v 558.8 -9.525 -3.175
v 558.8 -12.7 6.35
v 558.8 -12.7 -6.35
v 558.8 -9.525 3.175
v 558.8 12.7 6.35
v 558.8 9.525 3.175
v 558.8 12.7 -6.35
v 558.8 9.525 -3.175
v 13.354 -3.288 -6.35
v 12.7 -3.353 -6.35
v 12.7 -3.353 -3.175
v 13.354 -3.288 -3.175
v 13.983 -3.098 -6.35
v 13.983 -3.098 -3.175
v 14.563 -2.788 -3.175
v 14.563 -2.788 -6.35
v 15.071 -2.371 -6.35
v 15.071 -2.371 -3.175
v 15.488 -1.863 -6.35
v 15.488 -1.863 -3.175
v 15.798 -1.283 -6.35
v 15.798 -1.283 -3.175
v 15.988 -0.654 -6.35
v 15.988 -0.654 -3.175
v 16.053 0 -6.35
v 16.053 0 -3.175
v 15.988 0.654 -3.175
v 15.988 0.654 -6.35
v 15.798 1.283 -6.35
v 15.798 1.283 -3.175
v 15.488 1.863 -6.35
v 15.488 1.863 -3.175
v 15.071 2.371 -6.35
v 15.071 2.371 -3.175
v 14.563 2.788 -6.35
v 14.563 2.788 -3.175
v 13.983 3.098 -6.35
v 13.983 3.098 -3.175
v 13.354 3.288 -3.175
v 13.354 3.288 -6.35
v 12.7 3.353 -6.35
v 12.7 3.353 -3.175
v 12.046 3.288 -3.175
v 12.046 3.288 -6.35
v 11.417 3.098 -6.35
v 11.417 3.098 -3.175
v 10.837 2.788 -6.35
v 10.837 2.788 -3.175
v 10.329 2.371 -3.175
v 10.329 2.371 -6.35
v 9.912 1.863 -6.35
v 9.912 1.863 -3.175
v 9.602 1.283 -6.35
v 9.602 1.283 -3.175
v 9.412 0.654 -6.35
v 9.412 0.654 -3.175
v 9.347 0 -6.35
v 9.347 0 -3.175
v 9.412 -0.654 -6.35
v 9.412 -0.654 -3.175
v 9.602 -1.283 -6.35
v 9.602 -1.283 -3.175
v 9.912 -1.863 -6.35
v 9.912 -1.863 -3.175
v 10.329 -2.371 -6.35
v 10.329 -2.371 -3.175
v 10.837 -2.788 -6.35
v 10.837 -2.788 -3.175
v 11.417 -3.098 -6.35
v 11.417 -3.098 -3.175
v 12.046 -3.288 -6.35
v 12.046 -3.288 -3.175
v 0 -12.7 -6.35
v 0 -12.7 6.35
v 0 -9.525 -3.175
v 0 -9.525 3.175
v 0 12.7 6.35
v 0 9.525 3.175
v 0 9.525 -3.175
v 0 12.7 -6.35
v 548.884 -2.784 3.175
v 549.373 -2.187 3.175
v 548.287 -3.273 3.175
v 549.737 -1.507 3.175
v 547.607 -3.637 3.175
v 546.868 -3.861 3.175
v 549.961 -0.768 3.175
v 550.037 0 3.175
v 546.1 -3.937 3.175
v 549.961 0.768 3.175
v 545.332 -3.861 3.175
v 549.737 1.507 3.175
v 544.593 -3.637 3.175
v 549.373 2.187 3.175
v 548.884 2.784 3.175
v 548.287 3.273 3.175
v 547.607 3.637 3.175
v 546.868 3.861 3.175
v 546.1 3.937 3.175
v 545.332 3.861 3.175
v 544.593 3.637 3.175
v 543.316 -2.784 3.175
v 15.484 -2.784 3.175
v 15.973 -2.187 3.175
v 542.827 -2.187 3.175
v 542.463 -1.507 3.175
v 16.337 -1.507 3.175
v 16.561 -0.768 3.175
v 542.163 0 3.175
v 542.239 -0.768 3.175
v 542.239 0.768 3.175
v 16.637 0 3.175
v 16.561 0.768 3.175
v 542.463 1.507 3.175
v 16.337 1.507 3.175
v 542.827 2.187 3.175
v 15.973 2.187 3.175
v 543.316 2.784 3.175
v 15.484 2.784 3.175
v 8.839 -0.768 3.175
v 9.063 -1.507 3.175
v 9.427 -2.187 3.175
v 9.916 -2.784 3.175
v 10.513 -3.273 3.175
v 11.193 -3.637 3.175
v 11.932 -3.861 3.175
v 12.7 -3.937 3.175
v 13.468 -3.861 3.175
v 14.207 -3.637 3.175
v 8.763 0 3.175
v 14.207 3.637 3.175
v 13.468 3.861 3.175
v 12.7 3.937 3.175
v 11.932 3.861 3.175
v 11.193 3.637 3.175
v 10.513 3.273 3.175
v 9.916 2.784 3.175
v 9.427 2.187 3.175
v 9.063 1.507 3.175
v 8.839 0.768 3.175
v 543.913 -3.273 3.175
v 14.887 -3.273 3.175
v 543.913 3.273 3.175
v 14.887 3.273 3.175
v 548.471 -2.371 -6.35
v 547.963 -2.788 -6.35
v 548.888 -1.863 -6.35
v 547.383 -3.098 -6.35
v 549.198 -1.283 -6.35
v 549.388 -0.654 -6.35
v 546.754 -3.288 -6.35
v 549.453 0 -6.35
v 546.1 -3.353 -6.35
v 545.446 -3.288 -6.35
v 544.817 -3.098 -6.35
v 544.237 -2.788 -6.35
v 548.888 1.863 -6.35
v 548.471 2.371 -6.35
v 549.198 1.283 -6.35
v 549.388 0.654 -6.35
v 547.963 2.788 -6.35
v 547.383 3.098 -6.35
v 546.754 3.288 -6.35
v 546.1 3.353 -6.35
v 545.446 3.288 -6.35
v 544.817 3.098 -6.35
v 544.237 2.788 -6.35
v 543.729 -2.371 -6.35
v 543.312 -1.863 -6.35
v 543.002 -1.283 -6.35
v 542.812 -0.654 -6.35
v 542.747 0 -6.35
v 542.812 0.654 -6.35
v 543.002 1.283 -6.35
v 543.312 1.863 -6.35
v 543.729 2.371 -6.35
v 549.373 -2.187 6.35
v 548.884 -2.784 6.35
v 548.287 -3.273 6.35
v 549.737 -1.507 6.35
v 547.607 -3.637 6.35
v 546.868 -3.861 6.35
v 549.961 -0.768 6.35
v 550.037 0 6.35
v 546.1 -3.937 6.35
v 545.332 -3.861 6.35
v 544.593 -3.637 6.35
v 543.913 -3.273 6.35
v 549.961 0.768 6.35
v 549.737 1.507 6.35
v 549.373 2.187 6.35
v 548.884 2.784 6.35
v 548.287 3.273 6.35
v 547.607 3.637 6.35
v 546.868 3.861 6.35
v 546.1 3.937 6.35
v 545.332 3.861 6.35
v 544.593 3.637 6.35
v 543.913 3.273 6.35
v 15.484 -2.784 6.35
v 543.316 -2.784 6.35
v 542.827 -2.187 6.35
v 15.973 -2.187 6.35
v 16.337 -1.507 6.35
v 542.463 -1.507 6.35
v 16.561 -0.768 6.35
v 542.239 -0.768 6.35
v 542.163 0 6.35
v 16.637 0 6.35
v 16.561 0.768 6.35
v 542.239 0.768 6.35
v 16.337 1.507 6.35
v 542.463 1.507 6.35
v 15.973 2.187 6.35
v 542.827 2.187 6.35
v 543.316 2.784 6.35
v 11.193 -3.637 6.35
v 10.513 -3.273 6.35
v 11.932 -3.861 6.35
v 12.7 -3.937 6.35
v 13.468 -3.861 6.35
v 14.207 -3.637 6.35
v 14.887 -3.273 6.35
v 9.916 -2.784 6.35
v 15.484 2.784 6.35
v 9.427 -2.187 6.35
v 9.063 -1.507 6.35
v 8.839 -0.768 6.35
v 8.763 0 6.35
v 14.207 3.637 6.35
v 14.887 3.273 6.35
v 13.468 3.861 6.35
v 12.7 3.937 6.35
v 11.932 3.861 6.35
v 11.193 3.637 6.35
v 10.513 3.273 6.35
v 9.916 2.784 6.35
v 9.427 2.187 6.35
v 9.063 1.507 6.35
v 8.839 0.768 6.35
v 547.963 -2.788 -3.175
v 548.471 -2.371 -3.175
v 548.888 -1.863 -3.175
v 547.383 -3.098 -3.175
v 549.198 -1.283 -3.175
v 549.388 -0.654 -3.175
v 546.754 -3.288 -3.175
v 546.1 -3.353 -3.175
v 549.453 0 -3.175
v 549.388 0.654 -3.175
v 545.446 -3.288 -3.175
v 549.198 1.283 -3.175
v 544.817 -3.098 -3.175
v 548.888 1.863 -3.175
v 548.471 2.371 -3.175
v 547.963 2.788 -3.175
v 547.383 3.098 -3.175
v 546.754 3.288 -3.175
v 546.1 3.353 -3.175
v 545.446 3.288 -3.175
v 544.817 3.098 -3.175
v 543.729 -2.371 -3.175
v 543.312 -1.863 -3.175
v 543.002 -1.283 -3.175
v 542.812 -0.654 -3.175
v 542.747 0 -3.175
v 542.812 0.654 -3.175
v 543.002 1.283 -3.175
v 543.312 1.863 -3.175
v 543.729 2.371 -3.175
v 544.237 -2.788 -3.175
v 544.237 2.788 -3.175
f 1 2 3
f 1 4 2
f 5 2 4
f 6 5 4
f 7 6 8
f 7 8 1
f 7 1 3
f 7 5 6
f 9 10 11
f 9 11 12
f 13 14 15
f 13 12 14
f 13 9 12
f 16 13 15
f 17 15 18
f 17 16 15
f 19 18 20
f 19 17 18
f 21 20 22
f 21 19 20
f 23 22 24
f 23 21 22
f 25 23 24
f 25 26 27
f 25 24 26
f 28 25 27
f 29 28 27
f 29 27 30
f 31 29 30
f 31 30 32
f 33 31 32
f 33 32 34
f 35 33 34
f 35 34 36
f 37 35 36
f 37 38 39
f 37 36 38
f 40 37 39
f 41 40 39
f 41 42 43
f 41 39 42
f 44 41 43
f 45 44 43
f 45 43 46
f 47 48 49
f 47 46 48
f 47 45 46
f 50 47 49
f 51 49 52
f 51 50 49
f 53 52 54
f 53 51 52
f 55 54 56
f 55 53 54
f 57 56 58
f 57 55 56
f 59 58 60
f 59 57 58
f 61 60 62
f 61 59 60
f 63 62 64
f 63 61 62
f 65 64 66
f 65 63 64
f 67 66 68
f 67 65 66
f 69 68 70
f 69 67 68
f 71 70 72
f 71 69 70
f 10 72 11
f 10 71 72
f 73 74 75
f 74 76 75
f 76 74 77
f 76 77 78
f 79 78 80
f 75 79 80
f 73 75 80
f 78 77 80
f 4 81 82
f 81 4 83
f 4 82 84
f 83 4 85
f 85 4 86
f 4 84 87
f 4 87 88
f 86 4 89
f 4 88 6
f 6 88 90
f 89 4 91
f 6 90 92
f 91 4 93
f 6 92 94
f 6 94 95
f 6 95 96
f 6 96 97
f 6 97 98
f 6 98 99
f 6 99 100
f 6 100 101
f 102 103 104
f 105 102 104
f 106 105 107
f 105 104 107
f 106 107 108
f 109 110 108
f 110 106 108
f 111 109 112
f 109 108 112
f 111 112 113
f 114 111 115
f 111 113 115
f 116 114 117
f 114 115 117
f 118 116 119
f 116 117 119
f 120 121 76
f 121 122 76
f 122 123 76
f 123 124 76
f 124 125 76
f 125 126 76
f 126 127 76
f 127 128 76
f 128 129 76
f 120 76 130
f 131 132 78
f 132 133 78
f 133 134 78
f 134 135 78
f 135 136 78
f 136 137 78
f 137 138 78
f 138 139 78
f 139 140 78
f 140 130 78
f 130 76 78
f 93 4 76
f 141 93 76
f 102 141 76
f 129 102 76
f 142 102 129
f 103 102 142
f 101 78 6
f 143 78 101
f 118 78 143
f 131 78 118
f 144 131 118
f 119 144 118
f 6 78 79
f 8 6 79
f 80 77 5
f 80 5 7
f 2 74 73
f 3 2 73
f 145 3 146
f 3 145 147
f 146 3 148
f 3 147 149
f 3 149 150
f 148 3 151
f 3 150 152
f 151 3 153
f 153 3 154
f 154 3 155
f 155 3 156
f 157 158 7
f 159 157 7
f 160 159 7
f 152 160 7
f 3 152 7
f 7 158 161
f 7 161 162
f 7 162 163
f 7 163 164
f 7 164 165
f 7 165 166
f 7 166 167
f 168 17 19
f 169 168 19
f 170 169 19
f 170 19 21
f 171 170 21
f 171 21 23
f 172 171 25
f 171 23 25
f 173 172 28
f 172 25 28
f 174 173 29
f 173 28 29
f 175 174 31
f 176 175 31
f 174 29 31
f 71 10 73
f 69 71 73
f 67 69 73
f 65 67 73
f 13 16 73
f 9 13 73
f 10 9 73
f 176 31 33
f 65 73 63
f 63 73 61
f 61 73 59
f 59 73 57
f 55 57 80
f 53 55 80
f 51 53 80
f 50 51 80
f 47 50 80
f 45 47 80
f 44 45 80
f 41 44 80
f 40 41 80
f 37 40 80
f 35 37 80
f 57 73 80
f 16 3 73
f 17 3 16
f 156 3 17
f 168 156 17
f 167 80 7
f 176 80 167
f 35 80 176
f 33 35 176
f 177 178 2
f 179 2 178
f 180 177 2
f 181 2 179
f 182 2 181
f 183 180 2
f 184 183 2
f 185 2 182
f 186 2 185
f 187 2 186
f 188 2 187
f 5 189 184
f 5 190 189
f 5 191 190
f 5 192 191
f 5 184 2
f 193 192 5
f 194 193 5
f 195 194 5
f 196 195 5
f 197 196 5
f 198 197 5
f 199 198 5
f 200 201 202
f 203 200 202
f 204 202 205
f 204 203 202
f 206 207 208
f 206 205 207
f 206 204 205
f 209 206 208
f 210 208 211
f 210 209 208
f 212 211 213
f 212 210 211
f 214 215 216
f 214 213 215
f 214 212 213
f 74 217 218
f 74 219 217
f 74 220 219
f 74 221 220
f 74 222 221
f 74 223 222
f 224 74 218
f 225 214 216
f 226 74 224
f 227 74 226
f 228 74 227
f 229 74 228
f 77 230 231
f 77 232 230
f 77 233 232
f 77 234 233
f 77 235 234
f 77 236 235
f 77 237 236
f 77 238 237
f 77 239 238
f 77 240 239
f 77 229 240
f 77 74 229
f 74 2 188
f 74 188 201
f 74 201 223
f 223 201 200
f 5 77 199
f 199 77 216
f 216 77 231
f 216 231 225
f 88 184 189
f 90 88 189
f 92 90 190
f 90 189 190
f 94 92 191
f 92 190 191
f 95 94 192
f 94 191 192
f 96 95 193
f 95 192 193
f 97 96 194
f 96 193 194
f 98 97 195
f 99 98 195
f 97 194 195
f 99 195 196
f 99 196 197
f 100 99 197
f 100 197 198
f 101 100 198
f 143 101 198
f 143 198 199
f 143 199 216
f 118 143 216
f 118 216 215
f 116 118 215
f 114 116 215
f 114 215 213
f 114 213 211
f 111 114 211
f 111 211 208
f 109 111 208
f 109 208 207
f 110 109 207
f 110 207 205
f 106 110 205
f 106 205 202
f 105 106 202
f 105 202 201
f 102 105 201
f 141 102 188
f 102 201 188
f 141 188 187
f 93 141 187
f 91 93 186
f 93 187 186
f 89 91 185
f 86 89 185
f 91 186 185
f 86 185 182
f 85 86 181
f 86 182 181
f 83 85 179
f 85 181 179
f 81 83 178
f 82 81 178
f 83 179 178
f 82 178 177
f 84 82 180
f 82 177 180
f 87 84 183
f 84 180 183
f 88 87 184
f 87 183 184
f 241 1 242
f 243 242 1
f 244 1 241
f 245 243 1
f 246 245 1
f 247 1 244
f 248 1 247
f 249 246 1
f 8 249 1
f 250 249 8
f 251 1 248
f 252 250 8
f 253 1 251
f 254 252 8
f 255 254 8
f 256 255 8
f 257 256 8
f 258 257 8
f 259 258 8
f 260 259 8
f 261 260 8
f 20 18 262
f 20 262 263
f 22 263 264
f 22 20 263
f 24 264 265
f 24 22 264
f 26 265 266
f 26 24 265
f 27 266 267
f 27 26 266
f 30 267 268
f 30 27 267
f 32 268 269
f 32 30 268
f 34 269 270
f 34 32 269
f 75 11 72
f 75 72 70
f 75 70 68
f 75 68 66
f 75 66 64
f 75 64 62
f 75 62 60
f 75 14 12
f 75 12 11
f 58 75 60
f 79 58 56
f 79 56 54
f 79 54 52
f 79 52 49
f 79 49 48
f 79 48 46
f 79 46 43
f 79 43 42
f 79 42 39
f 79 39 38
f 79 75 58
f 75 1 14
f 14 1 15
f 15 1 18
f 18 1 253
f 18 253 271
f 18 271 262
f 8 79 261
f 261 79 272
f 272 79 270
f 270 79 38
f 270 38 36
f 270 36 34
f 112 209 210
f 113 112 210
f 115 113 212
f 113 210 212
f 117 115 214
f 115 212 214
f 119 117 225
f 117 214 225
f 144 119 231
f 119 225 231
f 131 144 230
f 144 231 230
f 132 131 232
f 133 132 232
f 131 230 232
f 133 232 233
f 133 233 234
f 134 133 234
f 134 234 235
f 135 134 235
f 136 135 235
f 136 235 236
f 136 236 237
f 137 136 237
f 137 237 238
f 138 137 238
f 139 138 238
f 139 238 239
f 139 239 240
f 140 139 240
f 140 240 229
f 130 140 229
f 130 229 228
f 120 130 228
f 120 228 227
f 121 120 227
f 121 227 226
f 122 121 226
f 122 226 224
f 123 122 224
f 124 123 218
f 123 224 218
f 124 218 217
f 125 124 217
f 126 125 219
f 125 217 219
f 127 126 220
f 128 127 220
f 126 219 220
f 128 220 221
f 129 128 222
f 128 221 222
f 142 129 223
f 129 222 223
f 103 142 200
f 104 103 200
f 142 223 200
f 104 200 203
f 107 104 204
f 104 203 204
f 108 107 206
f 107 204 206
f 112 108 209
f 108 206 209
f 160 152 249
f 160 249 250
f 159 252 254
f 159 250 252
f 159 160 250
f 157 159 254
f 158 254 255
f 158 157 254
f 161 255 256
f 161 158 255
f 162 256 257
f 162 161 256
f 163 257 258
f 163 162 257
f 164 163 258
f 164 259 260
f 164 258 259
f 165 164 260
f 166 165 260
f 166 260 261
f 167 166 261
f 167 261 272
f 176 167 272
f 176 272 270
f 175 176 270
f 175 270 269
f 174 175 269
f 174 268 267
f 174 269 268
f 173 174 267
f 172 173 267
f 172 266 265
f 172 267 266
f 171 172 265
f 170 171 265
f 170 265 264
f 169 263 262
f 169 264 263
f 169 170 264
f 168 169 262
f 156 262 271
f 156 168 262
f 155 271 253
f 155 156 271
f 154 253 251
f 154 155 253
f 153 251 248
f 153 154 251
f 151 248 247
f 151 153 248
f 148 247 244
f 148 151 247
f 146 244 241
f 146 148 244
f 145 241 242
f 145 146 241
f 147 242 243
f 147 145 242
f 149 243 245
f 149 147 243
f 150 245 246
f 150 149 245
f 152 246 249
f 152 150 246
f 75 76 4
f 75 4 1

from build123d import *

# Parameters (mm, degrees)
SKETCH1_W               = 12.7
SKETCH1_H               = 25.4
SKETCH1_W_2             = 6.35
SKETCH1_H_2             = 19.05
BOSS_EXTRUDE1_DEPTH     = 558.8
CUT_EXTRUDE1_DEPTH      = 560.088561858
CUT_EXTRUDE1_DEPTH_BACK = 560.088561858
SKETCH2_R               = 3.3528
CUT_EXTRUDE2_REACH      = 561.089
SKETCH3_R               = 3.937


with BuildPart() as part:
    # Sketch1 → Boss-Extrude1 (new body)
    with BuildSketch(Plane(origin=(0, 0, 0), x_dir=(0, 0, -1), z_dir=(1, 0, 0))):
        Rectangle(SKETCH1_W, SKETCH1_H)
        Rectangle(SKETCH1_W_2, SKETCH1_H_2, mode=Mode.SUBTRACT)
    extrude(amount=BOSS_EXTRUDE1_DEPTH)

    # Sketch2 → Cut-Extrude1 (cut, two sides: drawn at the far end of the back side and taken through both)
    with BuildSketch(Plane.XY.offset(6.35).offset(-CUT_EXTRUDE1_DEPTH_BACK)):
        with Locations((546.1, 0)):
            Circle(SKETCH2_R)
        with Locations(Location((12.7, 0, 0), (0, 0, 270))):
            Circle(SKETCH2_R)
    extrude(amount=CUT_EXTRUDE1_DEPTH + CUT_EXTRUDE1_DEPTH_BACK, mode=Mode.SUBTRACT)

    # Sketch3 → Cut-Extrude2 (cut, up to next)
    with BuildSketch(Plane.XY.offset(6.35), mode=Mode.PRIVATE) as cut_extrude2_sk1:
        with Locations((546.1, 0)):
            Circle(SKETCH3_R)
    cut_extrude2_tool1 = extrude(cut_extrude2_sk1.sketch, amount=-CUT_EXTRUDE2_REACH, mode=Mode.PRIVATE) & part.part
    # Sketch3 → Cut-Extrude2 (cut, up to next)
    with BuildSketch(Plane.XY.offset(6.35), mode=Mode.PRIVATE) as cut_extrude2_sk2:
        with Locations((12.7, 0)):
            Circle(SKETCH3_R)
    cut_extrude2_tool2 = extrude(cut_extrude2_sk2.sketch, amount=-CUT_EXTRUDE2_REACH, mode=Mode.PRIVATE) & part.part
    add(cut_extrude2_tool1.solids().sort_by_distance((546.1, 0, 6.35))[0], mode=Mode.SUBTRACT)
    add(cut_extrude2_tool2.solids().sort_by_distance((12.7, 0, 6.35))[0], mode=Mode.SUBTRACT)


solid = part.part
